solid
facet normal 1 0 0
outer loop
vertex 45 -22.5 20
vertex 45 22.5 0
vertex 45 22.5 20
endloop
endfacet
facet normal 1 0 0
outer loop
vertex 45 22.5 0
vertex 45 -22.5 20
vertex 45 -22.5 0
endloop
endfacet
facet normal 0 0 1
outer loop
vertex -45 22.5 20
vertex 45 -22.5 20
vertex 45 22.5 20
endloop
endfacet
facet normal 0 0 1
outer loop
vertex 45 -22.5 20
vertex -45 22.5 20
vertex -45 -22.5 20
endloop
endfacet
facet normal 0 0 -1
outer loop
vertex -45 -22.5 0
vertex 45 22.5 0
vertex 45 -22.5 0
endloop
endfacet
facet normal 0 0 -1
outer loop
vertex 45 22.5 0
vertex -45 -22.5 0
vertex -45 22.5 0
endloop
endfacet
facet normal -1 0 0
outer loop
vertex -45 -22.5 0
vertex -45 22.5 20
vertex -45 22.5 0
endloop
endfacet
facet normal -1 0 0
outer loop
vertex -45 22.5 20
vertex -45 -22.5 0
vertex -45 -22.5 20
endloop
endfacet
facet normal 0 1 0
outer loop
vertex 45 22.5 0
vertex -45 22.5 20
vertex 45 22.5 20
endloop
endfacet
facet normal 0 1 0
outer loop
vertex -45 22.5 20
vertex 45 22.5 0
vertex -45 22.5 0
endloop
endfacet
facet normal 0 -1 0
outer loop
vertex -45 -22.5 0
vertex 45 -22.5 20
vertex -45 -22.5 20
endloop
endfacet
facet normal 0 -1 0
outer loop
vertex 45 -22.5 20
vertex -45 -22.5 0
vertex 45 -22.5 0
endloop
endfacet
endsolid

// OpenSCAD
// Built by bench/smallmodels/features/compiler.py from a list of features.
$fn = 64;
difference() {
  union() {
    translate([0, 0, 0]) translate([-45, -22.5, 0]) cube([90, 45, 20]);
  }
  union() {
    translate([45, -38.5, 9.99]) rotate([0, 0, 0]) hull() { for (s = [-1, 1]) translate([s * 37.7, 0, 0]) cylinder(d = 1.6, h = 10.02); }
  }
}
